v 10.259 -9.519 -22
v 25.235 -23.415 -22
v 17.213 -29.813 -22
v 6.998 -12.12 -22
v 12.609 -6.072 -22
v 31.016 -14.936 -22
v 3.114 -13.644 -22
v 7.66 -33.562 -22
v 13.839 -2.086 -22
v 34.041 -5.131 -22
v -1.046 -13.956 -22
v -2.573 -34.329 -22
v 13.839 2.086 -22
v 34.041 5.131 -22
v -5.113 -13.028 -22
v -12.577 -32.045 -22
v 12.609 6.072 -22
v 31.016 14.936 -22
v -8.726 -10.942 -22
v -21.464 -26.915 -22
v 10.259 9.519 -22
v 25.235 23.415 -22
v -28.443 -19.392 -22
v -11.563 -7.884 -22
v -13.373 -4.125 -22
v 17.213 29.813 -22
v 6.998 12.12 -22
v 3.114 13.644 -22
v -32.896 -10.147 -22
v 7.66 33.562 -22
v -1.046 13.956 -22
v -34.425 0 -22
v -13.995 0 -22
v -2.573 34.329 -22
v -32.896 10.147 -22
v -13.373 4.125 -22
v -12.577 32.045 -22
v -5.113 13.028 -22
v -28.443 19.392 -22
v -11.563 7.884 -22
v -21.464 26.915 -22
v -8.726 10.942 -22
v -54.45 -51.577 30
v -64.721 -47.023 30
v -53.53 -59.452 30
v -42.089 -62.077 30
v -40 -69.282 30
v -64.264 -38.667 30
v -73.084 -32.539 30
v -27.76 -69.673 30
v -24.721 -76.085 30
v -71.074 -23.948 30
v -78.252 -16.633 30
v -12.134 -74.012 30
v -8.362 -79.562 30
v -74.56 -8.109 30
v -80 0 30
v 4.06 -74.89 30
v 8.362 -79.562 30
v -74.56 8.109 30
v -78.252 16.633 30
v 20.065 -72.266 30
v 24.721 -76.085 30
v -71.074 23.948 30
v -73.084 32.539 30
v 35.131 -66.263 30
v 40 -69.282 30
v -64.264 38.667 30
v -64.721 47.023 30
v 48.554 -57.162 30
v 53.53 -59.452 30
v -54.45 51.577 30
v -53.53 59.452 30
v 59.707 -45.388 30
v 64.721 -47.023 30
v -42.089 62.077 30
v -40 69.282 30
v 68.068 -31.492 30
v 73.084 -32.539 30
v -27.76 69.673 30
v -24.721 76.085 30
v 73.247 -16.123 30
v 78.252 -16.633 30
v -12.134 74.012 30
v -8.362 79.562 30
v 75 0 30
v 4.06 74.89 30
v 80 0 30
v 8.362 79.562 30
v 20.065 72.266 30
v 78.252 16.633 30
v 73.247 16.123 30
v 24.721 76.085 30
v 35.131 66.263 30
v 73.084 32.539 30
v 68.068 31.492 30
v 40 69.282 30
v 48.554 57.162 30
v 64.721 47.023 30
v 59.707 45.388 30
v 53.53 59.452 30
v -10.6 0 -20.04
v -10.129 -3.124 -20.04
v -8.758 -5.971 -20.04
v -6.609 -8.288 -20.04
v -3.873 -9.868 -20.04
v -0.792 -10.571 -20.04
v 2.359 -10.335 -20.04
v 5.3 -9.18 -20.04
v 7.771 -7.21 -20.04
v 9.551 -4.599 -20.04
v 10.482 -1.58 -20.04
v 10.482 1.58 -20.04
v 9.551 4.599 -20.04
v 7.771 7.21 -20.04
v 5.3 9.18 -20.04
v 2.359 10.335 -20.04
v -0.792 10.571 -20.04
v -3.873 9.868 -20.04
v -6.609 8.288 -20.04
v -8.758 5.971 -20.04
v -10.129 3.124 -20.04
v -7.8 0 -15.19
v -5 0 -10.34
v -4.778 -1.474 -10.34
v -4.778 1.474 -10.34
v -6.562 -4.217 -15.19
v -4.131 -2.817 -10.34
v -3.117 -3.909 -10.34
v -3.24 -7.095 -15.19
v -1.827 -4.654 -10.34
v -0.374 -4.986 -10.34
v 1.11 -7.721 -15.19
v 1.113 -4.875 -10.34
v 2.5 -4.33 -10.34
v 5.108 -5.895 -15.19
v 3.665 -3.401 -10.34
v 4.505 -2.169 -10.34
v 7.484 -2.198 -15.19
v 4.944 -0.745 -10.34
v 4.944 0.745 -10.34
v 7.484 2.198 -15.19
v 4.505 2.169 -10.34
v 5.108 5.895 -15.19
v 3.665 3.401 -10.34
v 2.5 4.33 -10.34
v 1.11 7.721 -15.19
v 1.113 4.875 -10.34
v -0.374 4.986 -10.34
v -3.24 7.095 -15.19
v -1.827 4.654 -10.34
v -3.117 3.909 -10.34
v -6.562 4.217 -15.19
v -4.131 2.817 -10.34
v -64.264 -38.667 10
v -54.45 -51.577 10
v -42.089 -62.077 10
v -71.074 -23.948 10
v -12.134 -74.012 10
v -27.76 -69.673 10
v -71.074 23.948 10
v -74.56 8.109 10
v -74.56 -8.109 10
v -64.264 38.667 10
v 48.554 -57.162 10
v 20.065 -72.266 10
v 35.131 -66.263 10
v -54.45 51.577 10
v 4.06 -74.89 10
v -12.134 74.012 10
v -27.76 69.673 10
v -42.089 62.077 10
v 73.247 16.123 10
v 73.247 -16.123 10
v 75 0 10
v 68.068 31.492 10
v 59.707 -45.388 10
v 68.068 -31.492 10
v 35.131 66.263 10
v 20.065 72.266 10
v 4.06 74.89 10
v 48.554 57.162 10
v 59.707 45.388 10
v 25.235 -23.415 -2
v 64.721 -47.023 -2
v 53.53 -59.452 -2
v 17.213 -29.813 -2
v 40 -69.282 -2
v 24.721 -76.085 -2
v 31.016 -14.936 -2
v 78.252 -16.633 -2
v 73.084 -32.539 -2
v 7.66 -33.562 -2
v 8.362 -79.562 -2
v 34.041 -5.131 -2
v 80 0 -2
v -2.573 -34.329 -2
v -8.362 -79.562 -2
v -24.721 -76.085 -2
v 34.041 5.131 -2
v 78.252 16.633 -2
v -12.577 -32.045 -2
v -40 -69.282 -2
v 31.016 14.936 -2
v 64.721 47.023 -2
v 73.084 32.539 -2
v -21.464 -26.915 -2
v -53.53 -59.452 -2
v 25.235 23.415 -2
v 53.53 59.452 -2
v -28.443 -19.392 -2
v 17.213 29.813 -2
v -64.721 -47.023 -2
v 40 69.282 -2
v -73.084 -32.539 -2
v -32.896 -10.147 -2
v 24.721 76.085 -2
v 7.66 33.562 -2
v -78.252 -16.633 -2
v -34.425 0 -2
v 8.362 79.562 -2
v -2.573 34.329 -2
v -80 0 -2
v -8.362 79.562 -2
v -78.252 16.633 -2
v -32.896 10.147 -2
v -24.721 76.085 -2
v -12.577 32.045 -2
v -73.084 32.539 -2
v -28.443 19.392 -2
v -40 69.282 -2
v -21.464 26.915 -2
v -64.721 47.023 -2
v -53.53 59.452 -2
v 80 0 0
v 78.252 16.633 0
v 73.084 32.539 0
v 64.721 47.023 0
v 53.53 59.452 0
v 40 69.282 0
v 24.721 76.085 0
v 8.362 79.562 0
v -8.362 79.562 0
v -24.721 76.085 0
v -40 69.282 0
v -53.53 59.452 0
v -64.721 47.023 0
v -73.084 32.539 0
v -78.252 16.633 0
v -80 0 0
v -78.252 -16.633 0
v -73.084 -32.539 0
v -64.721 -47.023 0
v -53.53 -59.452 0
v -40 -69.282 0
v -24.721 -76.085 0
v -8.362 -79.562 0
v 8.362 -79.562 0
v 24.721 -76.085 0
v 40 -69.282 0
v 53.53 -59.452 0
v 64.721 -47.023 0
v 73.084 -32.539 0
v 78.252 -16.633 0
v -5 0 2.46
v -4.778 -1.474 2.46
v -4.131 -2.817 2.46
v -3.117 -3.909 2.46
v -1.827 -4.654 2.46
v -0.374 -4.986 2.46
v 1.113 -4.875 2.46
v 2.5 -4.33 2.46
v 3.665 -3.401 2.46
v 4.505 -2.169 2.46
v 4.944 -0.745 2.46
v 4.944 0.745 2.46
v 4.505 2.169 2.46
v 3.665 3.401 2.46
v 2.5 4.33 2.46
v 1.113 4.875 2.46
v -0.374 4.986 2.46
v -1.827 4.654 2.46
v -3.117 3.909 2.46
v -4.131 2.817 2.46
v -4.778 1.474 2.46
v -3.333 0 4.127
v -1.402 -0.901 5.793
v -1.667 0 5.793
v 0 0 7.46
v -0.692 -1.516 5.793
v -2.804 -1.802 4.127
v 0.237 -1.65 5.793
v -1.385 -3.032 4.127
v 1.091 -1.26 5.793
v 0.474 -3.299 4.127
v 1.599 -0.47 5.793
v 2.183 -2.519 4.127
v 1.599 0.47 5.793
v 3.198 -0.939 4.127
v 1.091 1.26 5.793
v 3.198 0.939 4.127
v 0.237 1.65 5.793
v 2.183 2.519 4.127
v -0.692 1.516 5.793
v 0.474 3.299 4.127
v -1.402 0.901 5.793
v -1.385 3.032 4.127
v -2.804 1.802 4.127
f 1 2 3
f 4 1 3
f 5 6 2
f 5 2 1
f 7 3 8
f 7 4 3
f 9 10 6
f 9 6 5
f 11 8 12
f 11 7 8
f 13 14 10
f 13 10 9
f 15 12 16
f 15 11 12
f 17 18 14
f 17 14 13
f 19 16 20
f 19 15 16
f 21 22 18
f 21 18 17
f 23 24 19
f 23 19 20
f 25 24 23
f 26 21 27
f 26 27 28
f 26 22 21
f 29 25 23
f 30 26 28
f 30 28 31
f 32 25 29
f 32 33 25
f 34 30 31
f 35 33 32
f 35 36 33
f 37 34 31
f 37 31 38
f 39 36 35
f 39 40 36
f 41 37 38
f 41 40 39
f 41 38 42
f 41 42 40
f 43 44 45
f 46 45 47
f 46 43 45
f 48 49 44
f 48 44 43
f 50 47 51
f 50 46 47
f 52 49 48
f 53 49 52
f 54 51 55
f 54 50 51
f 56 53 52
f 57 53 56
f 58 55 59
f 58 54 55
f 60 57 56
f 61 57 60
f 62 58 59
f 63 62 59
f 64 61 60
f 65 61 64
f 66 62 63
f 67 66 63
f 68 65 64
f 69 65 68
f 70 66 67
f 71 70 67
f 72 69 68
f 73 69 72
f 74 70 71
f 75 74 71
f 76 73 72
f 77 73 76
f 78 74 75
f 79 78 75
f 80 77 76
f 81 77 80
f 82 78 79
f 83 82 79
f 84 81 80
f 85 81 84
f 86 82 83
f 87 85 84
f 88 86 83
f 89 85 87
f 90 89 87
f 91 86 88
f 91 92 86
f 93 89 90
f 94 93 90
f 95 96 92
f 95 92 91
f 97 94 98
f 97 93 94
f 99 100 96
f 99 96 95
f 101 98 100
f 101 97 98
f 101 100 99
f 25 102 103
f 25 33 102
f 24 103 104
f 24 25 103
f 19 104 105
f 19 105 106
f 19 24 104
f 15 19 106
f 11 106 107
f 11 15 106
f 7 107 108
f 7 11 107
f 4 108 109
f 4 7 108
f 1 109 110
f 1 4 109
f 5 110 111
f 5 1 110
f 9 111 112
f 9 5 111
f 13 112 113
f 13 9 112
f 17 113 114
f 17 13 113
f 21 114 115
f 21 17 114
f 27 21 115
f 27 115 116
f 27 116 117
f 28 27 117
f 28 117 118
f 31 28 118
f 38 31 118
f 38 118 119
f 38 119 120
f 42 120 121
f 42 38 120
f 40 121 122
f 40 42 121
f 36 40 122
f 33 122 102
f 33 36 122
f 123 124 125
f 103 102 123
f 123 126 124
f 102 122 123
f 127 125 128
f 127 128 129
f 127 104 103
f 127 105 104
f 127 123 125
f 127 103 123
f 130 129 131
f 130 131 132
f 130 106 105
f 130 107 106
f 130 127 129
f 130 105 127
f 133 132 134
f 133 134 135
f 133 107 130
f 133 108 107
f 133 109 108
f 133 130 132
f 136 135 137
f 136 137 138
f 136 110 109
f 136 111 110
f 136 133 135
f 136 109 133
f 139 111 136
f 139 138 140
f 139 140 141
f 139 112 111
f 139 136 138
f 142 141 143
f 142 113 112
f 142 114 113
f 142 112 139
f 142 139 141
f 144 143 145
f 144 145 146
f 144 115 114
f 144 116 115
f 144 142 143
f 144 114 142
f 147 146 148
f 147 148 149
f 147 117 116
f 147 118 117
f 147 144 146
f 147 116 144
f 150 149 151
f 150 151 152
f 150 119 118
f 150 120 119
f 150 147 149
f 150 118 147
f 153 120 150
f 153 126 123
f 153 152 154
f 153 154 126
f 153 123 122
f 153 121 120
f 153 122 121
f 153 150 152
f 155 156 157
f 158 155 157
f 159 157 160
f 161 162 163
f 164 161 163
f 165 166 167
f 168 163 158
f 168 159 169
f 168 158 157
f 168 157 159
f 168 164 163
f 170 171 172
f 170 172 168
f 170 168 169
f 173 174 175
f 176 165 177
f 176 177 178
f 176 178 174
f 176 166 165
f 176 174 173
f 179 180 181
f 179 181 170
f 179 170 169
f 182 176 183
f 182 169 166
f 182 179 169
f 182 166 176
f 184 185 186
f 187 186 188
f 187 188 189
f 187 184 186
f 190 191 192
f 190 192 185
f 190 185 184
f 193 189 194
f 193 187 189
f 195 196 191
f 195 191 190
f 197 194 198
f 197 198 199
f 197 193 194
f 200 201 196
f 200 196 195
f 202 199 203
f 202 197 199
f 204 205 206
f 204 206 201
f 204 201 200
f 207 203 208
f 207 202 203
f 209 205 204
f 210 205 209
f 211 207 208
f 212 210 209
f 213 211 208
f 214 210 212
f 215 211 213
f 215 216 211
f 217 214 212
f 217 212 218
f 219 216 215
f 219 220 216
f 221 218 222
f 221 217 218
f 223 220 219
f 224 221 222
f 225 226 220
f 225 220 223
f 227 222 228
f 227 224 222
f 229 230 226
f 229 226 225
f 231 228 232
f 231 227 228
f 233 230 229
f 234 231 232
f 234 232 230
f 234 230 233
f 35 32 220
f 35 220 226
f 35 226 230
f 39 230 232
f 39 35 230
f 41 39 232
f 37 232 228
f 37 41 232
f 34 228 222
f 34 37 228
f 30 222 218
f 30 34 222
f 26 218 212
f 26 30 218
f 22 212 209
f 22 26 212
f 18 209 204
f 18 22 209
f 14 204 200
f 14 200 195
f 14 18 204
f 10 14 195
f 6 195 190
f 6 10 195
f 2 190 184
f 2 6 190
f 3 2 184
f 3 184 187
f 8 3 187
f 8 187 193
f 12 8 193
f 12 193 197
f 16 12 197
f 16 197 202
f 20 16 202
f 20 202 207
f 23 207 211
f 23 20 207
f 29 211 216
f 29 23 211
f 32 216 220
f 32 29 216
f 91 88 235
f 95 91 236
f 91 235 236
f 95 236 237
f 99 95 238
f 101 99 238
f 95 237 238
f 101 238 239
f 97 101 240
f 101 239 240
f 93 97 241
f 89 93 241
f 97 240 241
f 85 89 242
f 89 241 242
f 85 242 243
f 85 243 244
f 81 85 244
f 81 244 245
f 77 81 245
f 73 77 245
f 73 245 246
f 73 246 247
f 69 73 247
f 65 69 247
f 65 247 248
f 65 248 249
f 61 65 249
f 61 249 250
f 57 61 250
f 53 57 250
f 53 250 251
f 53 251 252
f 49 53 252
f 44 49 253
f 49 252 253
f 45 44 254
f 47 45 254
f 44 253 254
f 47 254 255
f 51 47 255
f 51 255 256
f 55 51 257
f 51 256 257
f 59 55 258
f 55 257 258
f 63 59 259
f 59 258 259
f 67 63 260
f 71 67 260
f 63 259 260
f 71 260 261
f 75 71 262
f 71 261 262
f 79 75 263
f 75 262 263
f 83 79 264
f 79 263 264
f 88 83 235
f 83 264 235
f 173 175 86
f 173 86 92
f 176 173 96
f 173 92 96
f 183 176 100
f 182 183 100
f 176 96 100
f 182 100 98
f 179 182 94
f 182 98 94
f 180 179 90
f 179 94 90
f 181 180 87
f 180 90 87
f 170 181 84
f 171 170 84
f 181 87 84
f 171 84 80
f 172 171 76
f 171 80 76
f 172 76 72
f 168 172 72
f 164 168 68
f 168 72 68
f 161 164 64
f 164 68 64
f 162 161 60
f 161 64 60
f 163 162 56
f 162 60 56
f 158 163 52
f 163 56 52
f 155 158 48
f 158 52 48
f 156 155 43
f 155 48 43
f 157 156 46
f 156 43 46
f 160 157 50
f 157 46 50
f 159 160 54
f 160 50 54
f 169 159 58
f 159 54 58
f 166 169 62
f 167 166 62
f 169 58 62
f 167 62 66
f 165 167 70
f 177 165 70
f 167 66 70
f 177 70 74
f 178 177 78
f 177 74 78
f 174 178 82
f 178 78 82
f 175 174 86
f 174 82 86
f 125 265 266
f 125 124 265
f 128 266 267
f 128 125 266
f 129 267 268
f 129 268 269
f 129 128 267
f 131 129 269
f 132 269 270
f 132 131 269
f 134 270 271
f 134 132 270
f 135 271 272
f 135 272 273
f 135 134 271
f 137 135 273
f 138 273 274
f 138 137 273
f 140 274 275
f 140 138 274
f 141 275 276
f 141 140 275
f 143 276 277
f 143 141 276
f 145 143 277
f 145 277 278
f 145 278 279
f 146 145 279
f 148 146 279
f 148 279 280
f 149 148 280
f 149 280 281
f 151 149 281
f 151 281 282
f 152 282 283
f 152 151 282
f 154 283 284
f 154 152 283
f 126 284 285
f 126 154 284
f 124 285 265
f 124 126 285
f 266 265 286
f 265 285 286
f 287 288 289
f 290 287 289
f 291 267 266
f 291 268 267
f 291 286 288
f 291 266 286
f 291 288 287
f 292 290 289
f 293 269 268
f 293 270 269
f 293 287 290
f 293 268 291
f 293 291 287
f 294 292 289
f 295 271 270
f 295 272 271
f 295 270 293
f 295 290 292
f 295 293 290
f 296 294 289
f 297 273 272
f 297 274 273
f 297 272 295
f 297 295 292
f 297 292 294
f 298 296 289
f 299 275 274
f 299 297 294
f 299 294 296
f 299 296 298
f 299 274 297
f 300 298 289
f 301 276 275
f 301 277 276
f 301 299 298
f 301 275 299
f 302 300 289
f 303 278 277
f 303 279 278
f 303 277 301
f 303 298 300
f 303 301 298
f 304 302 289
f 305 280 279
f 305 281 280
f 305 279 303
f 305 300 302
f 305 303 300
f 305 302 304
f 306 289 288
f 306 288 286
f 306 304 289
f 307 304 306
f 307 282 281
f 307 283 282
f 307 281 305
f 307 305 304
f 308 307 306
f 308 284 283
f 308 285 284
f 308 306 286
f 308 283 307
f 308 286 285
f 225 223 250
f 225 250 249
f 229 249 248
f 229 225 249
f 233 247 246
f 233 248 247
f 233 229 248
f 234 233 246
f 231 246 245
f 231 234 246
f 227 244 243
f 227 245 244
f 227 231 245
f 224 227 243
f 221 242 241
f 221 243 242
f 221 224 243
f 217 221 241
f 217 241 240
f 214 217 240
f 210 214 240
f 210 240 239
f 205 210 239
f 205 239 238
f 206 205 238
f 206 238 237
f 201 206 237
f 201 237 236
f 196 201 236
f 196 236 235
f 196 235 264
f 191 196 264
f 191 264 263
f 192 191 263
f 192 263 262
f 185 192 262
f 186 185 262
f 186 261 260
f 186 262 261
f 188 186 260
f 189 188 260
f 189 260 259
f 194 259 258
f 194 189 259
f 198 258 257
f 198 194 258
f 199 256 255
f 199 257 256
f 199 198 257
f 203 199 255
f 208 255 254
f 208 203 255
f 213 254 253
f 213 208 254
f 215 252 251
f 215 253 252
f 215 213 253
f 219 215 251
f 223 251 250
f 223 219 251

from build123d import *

# Parameters (mm, degrees)
SZKIC1_R                    = 80
DODANIE_WYCI_GNI_CIE1_DEPTH = 30
SZKIC2_R                    = 75
WYTNIJ_WYCI_GNI_CIE2_DEPTH  = 20
DODANIE_WYCI_GNI_CIE2_START = 22
SZKIC20_R                   = 80
DODANIE_WYCI_GNI_CIE2_DEPTH = 22
SZKIC22_R                   = 80
SZKIC22_R_2                 = 34.425
WYTNIJ_WYCI_GNI_CIE3_DEPTH  = 20


with BuildPart() as part:
    # Szkic1 → Dodanie-wyciągnięcie1 (new body)
    with BuildSketch(Plane.XY):
        Circle(SZKIC1_R)
    extrude(amount=DODANIE_WYCI_GNI_CIE1_DEPTH)

    # Szkic2 → Wytnij-wyciągnięcie2 (cut)
    with BuildSketch(Plane.XY.offset(30)):
        Circle(SZKIC2_R)
    extrude(amount=-WYTNIJ_WYCI_GNI_CIE2_DEPTH, mode=Mode.SUBTRACT)

    # Szkic20 → Dodanie-wyciągnięcie2 (add)
    with BuildSketch(Plane(origin=(0, 0, 0), x_dir=(-1, 0, 0), z_dir=(0, 0, -1)).offset(DODANIE_WYCI_GNI_CIE2_START)):
        Circle(SZKIC20_R)
    extrude(amount=-DODANIE_WYCI_GNI_CIE2_DEPTH)

    # Szkic21 → Wycięcie-obrót1 (revolve, cut)
    with BuildSketch(Plane(origin=(0, 0, 0), x_dir=(1, 0, 0), z_dir=(0, 1, 0))):
        Polygon((0, 22), (0, -7.46), (-5, -2.46), (-5, 10.34), (-10.600297611, 20.04), (-13.995117194, 22), align=None)
    revolve(axis=Axis((0, 0, 0), (0, 0, 1)), mode=Mode.SUBTRACT)

    # Szkic22 → Wytnij-wyciągnięcie3 (cut)
    with BuildSketch(Plane(origin=(0, 0, -22), x_dir=(-1, 0, 0), z_dir=(0, 0, -1))):
        Circle(SZKIC22_R)
        Circle(SZKIC22_R_2, mode=Mode.SUBTRACT)
    extrude(amount=-WYTNIJ_WYCI_GNI_CIE3_DEPTH, mode=Mode.SUBTRACT)


solid = part.part
